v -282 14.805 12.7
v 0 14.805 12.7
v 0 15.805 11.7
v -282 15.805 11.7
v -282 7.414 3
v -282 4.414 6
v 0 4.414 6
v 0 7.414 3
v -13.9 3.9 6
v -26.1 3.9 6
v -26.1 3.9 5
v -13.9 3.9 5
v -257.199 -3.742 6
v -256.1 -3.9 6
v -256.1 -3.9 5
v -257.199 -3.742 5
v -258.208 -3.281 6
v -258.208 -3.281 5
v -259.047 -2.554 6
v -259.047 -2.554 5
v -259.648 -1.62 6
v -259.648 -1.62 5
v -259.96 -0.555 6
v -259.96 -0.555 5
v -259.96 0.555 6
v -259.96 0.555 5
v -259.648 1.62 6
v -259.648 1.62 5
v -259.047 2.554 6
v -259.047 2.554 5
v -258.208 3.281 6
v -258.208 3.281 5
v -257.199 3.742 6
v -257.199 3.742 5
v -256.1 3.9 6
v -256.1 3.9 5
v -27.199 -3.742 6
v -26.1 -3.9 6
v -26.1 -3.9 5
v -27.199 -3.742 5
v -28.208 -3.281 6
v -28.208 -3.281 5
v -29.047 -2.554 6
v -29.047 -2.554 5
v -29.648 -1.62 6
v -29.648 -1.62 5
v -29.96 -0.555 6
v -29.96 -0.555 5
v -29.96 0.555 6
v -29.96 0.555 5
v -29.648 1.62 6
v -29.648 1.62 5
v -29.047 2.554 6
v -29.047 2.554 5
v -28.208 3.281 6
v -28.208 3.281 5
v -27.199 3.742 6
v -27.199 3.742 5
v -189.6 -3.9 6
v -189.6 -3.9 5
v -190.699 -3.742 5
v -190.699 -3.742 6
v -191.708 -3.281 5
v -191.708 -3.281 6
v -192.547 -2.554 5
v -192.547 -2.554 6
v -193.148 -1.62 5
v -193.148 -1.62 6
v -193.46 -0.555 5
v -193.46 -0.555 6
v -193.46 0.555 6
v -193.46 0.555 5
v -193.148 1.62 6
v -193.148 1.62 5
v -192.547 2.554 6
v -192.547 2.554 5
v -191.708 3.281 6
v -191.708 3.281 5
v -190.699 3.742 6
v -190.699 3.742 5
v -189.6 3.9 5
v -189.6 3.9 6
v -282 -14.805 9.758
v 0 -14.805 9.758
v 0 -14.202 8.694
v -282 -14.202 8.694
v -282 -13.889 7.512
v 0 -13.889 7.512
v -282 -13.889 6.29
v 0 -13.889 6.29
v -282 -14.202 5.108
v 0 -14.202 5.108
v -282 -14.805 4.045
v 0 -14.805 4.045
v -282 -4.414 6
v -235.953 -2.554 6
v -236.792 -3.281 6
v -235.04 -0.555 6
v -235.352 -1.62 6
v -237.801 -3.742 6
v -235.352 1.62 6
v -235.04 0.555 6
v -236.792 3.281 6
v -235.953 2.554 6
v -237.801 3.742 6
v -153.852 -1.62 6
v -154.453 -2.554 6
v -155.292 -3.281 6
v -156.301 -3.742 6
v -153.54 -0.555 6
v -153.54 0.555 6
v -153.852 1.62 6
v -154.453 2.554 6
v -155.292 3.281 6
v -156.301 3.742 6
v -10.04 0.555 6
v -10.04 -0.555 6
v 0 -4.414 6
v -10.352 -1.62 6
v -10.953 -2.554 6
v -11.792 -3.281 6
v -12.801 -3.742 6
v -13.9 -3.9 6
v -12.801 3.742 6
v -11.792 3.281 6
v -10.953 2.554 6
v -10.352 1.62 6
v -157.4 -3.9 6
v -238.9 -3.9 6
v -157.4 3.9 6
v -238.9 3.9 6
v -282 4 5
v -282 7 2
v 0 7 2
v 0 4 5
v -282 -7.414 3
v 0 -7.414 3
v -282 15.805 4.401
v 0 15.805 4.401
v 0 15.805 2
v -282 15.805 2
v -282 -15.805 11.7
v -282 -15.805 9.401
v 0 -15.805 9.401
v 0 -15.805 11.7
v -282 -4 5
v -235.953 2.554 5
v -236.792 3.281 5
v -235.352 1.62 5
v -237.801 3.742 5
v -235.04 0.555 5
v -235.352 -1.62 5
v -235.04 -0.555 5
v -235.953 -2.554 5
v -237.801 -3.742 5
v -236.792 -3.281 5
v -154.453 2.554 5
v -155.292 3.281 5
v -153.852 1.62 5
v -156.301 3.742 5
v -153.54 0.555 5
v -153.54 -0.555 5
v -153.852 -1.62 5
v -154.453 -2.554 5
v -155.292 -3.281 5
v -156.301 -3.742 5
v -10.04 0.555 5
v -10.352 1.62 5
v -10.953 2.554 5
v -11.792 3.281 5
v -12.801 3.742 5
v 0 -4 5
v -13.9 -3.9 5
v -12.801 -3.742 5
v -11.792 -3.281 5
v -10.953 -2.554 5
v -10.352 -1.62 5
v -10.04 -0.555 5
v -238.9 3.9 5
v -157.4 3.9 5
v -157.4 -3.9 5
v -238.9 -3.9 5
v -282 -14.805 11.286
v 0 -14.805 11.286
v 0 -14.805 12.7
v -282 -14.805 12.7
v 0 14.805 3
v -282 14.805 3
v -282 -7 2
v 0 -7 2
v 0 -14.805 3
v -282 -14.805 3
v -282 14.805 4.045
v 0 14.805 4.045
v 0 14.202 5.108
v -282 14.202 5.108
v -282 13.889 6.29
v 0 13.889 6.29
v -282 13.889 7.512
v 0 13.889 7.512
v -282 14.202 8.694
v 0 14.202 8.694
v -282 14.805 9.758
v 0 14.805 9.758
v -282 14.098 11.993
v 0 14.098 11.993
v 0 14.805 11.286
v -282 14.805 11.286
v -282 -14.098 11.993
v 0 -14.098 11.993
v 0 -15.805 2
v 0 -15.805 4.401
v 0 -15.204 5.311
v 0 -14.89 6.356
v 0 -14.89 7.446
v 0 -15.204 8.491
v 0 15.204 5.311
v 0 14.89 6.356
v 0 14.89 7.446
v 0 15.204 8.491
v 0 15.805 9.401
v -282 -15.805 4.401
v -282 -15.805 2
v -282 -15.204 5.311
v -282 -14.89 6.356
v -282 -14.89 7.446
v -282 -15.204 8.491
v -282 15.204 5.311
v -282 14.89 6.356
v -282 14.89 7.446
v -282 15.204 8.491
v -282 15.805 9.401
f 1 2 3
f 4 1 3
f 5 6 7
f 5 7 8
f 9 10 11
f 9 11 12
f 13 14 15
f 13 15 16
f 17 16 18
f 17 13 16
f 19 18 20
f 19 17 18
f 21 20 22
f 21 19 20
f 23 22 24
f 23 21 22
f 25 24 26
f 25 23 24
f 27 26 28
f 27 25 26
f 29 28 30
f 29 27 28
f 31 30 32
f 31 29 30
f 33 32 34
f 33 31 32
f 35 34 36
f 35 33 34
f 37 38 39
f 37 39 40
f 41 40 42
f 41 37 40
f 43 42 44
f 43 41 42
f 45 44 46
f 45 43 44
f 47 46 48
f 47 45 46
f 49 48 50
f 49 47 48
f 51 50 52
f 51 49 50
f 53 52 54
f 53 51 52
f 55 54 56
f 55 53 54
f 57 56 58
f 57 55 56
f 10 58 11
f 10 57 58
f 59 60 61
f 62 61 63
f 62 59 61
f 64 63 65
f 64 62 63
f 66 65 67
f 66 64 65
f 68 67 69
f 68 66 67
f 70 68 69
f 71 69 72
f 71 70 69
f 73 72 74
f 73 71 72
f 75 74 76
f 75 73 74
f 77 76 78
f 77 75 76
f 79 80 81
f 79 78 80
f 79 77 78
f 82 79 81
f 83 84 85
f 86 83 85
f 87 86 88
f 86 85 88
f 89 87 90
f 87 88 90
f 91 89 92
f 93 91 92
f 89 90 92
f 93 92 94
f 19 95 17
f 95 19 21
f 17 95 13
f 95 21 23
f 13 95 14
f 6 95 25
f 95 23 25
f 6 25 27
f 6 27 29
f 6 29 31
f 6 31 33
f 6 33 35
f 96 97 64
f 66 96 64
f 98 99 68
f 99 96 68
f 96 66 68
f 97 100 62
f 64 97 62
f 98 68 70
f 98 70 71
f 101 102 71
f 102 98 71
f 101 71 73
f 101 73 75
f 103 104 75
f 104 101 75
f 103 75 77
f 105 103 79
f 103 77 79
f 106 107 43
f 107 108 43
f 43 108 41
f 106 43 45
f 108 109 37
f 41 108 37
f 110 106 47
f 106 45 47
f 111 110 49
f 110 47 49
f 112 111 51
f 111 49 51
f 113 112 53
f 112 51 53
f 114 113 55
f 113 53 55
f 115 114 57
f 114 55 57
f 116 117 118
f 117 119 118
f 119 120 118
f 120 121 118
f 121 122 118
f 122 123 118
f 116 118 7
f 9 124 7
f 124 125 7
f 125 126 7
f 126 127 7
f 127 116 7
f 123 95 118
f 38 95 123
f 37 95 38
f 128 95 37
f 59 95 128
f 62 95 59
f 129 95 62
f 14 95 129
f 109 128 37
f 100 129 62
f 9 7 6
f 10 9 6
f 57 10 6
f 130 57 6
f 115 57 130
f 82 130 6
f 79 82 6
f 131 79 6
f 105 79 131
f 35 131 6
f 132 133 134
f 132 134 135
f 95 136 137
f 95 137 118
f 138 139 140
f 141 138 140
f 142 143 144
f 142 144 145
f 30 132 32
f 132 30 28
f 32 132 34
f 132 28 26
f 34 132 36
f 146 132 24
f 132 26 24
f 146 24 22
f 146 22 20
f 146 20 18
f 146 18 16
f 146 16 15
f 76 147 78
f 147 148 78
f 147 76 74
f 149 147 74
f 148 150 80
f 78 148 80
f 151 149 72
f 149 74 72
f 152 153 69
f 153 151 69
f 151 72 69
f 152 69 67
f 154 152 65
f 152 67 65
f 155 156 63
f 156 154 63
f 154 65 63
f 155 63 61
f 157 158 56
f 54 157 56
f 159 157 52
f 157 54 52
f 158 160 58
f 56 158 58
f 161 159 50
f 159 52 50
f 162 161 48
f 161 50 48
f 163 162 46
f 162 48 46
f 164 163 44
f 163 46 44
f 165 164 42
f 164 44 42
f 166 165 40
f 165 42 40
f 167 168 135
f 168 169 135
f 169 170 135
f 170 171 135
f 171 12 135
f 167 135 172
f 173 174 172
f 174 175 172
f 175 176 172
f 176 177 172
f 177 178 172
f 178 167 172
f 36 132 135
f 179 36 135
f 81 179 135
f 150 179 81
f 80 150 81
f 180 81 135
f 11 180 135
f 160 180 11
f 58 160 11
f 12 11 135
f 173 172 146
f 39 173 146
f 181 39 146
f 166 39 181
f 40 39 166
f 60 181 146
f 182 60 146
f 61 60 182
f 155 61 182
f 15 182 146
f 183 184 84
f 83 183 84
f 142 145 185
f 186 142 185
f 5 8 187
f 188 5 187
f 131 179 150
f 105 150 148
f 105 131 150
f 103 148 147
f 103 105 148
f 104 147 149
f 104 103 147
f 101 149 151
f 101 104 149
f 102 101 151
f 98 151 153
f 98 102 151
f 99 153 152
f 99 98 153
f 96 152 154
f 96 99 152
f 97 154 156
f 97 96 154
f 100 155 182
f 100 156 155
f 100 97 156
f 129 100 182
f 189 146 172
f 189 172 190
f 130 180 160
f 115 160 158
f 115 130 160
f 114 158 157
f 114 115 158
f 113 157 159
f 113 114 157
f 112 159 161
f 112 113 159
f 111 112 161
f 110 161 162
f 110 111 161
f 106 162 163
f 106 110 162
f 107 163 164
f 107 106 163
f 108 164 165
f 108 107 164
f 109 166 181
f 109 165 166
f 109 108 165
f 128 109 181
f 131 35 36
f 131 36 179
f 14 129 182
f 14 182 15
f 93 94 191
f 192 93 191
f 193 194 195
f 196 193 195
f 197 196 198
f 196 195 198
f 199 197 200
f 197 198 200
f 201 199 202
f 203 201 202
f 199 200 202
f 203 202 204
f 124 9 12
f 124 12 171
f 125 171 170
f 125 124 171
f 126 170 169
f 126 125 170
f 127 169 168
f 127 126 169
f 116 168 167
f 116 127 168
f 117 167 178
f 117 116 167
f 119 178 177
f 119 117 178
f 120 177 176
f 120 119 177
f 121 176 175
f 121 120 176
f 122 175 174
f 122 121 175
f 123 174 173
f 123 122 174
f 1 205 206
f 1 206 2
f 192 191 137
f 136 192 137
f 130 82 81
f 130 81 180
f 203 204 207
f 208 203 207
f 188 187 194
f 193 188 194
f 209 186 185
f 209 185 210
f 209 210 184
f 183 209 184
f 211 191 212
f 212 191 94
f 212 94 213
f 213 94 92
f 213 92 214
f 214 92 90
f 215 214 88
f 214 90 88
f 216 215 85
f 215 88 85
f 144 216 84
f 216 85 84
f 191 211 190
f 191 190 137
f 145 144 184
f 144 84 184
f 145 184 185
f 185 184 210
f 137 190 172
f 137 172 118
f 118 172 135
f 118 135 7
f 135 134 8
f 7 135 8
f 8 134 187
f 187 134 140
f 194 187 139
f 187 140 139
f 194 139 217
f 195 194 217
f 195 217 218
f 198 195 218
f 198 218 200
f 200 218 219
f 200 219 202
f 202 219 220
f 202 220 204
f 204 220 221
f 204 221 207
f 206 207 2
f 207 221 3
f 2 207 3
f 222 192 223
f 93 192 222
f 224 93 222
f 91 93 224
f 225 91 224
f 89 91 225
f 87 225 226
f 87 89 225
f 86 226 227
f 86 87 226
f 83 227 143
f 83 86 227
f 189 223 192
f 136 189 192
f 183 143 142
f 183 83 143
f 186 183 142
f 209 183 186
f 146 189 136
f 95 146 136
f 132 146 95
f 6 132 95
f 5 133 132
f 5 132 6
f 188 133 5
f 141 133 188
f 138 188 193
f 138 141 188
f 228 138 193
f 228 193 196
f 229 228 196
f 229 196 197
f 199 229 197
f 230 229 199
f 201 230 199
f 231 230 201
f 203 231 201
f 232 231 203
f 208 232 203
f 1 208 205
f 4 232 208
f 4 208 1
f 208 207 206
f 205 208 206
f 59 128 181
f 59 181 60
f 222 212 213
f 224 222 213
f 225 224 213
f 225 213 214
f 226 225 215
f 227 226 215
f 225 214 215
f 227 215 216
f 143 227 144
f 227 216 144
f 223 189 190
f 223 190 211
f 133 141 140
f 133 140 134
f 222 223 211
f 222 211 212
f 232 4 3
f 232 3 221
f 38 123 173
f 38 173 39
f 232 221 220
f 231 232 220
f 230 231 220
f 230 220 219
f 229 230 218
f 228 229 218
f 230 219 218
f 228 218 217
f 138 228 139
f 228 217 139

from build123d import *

# Parameters (mm, degrees)
EXTRUDE_THIN1_DEPTH   = 282
CORTE_EXTRUS_O1_DEPTH = 283.522008592


with BuildPart() as part:
    # Sketch1 → Extrude-Thin1 (new body)
    with BuildSketch(Plane(origin=(0, 0, 0), x_dir=(0, 0, -1), z_dir=(1, 0, 0))):
        with BuildLine():
            Line((-12.7, 14.804915028), (-11.7, 15.804915028))
            Line((-11.7, 15.804915028), (-9.401071342, 15.804915028))
            ThreePointArc((-9.401071342, 15.804915028), (-6.901071342, 14.85), (-4.401071342, 15.804915028))
            Line((-4.401071342, 15.804915028), (-2, 15.804915028))
            Line((-2, 15.804915028), (-2, 7))
            Line((-2, 7), (-5, 4))
            Line((-5, 4), (-5, -4))
            Line((-5, -4), (-2, -7))
            Line((-2, -7), (-2, -15.804915028))
            Line((-2, -15.804915028), (-4.401071342, -15.804915028))
            ThreePointArc((-4.401071342, -15.804915028), (-6.901071342, -14.85), (-9.401071342, -15.804915028))
            Line((-9.401071342, -15.804915028), (-11.7, -15.804915028))
            Line((-11.7, -15.804915028), (-12.7, -14.804915028))
            Line((-12.7, -14.804915028), (-11.992893219, -14.097808247))
            Line((-11.992893219, -14.097808247), (-11.285786438, -14.804915028))
            Line((-11.285786438, -14.804915028), (-9.757612967, -14.804915028))
            ThreePointArc((-9.757612967, -14.804915028), (-6.901071342, -13.85), (-4.044529716, -14.804915028))
            Line((-4.044529716, -14.804915028), (-3, -14.804915028))
            Line((-3, -14.804915028), (-3, -7.414213562))
            Line((-3, -7.414213562), (-6, -4.414213562))
            Line((-6, -4.414213562), (-6, 4.414213562))
            Line((-6, 4.414213562), (-3, 7.414213562))
            Line((-3, 7.414213562), (-3, 14.804915028))
            Line((-3, 14.804915028), (-4.044529716, 14.804915028))
            ThreePointArc((-4.044529716, 14.804915028), (-6.901071342, 13.85), (-9.757612967, 14.804915028))
            Line((-9.757612967, 14.804915028), (-11.285786438, 14.804915028))
            Line((-11.285786438, 14.804915028), (-11.992893219, 14.097808247))
            Line((-11.992893219, 14.097808247), (-12.7, 14.804915028))
        make_face()
    extrude(amount=-EXTRUDE_THIN1_DEPTH)

    # Esboço1 → Corte-extrusão1 (cut, through all)
    with BuildSketch(Plane.XY.offset(6)):
        with BuildLine():
            Line((-13.9, -3.9), (-26.1, -3.9))
            ThreePointArc((-26.1, -3.9), (-30, 0), (-26.1, 3.9))
            Line((-26.1, 3.9), (-13.9, 3.9))
            ThreePointArc((-13.9, 3.9), (-10, 0), (-13.9, -3.9))
        make_face()
        with BuildLine():
            Line((-189.6, 3.9), (-157.4, 3.9))
            ThreePointArc((-157.4, 3.9), (-153.5, 0), (-157.4, -3.9))
            Line((-157.4, -3.9), (-189.6, -3.9))
            ThreePointArc((-189.6, -3.9), (-193.5, 0), (-189.6, 3.9))
        make_face()
        with BuildLine():
            Line((-256.1, 3.9), (-238.9, 3.9))
            ThreePointArc((-238.9, 3.9), (-235, 0), (-238.9, -3.9))
            Line((-238.9, -3.9), (-256.1, -3.9))
            ThreePointArc((-256.1, -3.9), (-260, 0), (-256.1, 3.9))
        make_face()
    extrude(amount=-CORTE_EXTRUS_O1_DEPTH, mode=Mode.SUBTRACT)


solid = part.part
